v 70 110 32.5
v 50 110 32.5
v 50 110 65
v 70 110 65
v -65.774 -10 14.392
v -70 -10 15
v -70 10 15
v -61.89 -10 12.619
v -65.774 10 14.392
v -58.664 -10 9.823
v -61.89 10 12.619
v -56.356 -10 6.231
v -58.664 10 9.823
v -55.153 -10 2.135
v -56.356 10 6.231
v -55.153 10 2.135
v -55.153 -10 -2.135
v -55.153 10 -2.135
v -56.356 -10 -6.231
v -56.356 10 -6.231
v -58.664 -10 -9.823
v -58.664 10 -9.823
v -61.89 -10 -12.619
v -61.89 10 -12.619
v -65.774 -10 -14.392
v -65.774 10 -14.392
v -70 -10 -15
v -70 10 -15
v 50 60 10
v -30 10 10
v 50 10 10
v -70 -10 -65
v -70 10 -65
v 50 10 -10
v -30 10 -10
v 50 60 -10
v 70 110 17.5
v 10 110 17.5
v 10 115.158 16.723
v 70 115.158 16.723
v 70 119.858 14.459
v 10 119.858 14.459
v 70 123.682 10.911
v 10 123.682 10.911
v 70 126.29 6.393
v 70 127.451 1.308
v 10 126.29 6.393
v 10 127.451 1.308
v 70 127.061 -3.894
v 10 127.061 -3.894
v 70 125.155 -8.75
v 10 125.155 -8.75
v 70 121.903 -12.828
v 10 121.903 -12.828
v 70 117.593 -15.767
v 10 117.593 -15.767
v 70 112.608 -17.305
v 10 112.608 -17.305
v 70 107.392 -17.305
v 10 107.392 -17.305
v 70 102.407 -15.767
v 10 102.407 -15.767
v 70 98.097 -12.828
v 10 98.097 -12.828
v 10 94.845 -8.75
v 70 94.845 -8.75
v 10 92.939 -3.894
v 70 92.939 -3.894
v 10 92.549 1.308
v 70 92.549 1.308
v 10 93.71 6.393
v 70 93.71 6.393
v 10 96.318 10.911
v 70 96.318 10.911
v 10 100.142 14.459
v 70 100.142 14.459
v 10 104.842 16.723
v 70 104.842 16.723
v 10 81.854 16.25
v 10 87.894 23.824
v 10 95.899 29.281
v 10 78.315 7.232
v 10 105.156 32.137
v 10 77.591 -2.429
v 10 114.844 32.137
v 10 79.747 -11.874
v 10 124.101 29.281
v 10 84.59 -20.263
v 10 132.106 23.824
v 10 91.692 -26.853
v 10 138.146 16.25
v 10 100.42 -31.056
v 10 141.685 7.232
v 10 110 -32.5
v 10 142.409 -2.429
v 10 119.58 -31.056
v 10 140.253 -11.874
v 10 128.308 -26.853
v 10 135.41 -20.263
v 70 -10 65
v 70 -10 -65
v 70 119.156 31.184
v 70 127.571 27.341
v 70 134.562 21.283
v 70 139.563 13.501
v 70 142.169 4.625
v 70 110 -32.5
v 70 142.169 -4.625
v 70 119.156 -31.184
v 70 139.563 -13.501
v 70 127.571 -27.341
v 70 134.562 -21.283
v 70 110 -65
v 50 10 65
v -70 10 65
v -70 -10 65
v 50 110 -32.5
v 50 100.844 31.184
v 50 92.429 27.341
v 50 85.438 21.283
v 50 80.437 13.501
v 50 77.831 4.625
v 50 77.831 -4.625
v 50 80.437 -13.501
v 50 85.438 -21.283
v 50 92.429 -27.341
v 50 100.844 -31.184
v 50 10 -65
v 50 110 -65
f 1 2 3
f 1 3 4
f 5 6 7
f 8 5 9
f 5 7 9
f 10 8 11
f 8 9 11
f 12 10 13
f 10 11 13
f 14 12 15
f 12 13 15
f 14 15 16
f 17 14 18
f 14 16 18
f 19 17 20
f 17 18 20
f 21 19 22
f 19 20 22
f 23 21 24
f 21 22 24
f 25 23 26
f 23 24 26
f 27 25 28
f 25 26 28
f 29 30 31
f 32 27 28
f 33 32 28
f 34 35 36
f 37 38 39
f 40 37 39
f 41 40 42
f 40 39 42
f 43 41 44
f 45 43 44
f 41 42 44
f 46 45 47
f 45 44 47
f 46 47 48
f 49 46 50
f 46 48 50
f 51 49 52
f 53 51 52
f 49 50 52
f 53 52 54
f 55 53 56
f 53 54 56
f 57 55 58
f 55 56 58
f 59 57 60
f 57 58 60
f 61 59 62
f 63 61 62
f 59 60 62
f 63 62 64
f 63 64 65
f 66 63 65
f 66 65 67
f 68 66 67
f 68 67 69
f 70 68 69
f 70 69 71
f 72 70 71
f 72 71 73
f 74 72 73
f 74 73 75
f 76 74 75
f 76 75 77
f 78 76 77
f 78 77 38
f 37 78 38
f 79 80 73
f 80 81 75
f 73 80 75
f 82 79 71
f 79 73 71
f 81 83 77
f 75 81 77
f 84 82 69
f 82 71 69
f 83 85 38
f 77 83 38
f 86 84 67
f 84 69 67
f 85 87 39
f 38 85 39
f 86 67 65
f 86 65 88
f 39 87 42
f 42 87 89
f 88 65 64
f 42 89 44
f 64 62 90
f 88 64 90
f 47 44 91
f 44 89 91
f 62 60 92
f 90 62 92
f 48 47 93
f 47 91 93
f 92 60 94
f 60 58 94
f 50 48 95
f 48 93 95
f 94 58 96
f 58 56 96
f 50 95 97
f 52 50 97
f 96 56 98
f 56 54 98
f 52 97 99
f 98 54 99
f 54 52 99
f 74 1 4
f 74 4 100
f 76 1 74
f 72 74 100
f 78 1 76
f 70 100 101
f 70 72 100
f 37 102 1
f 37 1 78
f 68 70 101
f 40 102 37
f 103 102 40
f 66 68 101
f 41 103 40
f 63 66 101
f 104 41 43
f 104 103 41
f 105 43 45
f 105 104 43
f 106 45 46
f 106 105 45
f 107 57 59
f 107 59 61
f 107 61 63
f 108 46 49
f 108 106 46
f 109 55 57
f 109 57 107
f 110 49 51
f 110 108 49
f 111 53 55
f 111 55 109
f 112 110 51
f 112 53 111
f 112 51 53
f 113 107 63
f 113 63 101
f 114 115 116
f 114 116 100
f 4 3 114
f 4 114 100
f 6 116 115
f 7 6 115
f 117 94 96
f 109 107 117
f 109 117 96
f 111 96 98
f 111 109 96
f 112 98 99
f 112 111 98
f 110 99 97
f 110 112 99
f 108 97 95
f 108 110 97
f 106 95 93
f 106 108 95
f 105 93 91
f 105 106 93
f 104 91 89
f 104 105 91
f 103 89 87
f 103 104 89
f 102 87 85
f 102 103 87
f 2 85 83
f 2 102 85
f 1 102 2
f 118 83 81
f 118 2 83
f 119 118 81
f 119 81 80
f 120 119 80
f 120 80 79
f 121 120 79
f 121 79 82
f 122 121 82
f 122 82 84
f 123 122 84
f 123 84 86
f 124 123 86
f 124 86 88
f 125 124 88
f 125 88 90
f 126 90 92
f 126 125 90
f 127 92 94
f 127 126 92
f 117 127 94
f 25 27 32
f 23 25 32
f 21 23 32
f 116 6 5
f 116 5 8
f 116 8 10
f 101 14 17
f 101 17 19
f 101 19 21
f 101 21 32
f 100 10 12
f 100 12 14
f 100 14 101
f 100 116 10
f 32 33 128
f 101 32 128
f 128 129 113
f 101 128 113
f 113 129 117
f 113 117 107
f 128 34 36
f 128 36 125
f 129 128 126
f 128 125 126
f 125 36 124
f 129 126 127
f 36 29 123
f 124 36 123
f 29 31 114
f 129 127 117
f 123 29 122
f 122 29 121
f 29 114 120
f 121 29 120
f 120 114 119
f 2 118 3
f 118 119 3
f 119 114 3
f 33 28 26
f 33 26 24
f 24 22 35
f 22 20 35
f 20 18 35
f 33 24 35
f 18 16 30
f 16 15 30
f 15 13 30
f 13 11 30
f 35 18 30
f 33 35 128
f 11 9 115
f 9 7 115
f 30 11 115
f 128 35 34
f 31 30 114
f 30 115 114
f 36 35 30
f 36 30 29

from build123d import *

# Parameters (mm, degrees)
SKETCH_1_W          = 140
SKETCH_1_H          = 20
SKETCH_1_W_2        = 20
SKETCH_1_H_2        = 100
EXTRUDE_1_DEPTH     = 65
SKETCH_5_R          = 32.5
EXTRUDE_3_DEPTH     = 60
SKETCH_6_R          = 17.5
CUT_EXTRUDE_1_DEPTH = 176.87282337
SKETCH_7_R          = 15
CUT_EXTRUDE_2_DEPTH = 164.343962239
RIB_1_REACH         = 173.555
SKETCH_8_WALL_W     = 439.450580606
SKETCH_8_WALL_H     = 20


with BuildPart() as part:
    # Эскиз1 → Бобышка-Вытянуть1 (new, symmetric)
    with BuildSketch(Plane.XY):
        Rectangle(SKETCH_1_W, SKETCH_1_H)
        with Locations((60, 60)):
            Rectangle(SKETCH_1_W_2, SKETCH_1_H_2)
    extrude(amount=EXTRUDE_1_DEPTH, both=True)

    # Эскиз5 → Бобышка-Вытянуть3 (add)
    with BuildSketch(Plane(origin=(70, 0, 0), x_dir=(0, 0, -1), z_dir=(1, 0, 0))):
        with Locations((0, 110)):
            Circle(SKETCH_5_R)
    extrude(amount=-EXTRUDE_3_DEPTH)

    # Эскиз6 → Вырез-Вытянуть1 (cut, through all)
    with BuildSketch(Plane.ZY.offset(-10)):
        with Locations((0, 110)):
            Circle(SKETCH_6_R)
    extrude(amount=-CUT_EXTRUDE_1_DEPTH, mode=Mode.SUBTRACT)

    # Эскиз7 → Вырез-Вытянуть2 (cut, through all)
    with BuildSketch(Plane(origin=(0, 10, 0), x_dir=(1, 0, 0), z_dir=(0, 1, 0))):
        with Locations((-70, 0)):
            Circle(SKETCH_7_R)
    extrude(amount=-CUT_EXTRUDE_2_DEPTH, mode=Mode.SUBTRACT)

    # Эскиз8 wall → Ребро1 (add, up to next)
    with BuildSketch(Plane(origin=(10, 35, 0), x_dir=(0.847998304005, 0.529998940003, 0), z_dir=(-0.529998940003, 0.847998304005, 0)), mode=Mode.PRIVATE) as rib_1_sk1:
        Rectangle(SKETCH_8_WALL_W, SKETCH_8_WALL_H)
    rib_1_tool1 = extrude(rib_1_sk1.sketch, amount=-RIB_1_REACH, mode=Mode.PRIVATE) - part.part
    add(rib_1_tool1.solids().sort_by_distance((10, 35, 0))[0])


solid = part.part
